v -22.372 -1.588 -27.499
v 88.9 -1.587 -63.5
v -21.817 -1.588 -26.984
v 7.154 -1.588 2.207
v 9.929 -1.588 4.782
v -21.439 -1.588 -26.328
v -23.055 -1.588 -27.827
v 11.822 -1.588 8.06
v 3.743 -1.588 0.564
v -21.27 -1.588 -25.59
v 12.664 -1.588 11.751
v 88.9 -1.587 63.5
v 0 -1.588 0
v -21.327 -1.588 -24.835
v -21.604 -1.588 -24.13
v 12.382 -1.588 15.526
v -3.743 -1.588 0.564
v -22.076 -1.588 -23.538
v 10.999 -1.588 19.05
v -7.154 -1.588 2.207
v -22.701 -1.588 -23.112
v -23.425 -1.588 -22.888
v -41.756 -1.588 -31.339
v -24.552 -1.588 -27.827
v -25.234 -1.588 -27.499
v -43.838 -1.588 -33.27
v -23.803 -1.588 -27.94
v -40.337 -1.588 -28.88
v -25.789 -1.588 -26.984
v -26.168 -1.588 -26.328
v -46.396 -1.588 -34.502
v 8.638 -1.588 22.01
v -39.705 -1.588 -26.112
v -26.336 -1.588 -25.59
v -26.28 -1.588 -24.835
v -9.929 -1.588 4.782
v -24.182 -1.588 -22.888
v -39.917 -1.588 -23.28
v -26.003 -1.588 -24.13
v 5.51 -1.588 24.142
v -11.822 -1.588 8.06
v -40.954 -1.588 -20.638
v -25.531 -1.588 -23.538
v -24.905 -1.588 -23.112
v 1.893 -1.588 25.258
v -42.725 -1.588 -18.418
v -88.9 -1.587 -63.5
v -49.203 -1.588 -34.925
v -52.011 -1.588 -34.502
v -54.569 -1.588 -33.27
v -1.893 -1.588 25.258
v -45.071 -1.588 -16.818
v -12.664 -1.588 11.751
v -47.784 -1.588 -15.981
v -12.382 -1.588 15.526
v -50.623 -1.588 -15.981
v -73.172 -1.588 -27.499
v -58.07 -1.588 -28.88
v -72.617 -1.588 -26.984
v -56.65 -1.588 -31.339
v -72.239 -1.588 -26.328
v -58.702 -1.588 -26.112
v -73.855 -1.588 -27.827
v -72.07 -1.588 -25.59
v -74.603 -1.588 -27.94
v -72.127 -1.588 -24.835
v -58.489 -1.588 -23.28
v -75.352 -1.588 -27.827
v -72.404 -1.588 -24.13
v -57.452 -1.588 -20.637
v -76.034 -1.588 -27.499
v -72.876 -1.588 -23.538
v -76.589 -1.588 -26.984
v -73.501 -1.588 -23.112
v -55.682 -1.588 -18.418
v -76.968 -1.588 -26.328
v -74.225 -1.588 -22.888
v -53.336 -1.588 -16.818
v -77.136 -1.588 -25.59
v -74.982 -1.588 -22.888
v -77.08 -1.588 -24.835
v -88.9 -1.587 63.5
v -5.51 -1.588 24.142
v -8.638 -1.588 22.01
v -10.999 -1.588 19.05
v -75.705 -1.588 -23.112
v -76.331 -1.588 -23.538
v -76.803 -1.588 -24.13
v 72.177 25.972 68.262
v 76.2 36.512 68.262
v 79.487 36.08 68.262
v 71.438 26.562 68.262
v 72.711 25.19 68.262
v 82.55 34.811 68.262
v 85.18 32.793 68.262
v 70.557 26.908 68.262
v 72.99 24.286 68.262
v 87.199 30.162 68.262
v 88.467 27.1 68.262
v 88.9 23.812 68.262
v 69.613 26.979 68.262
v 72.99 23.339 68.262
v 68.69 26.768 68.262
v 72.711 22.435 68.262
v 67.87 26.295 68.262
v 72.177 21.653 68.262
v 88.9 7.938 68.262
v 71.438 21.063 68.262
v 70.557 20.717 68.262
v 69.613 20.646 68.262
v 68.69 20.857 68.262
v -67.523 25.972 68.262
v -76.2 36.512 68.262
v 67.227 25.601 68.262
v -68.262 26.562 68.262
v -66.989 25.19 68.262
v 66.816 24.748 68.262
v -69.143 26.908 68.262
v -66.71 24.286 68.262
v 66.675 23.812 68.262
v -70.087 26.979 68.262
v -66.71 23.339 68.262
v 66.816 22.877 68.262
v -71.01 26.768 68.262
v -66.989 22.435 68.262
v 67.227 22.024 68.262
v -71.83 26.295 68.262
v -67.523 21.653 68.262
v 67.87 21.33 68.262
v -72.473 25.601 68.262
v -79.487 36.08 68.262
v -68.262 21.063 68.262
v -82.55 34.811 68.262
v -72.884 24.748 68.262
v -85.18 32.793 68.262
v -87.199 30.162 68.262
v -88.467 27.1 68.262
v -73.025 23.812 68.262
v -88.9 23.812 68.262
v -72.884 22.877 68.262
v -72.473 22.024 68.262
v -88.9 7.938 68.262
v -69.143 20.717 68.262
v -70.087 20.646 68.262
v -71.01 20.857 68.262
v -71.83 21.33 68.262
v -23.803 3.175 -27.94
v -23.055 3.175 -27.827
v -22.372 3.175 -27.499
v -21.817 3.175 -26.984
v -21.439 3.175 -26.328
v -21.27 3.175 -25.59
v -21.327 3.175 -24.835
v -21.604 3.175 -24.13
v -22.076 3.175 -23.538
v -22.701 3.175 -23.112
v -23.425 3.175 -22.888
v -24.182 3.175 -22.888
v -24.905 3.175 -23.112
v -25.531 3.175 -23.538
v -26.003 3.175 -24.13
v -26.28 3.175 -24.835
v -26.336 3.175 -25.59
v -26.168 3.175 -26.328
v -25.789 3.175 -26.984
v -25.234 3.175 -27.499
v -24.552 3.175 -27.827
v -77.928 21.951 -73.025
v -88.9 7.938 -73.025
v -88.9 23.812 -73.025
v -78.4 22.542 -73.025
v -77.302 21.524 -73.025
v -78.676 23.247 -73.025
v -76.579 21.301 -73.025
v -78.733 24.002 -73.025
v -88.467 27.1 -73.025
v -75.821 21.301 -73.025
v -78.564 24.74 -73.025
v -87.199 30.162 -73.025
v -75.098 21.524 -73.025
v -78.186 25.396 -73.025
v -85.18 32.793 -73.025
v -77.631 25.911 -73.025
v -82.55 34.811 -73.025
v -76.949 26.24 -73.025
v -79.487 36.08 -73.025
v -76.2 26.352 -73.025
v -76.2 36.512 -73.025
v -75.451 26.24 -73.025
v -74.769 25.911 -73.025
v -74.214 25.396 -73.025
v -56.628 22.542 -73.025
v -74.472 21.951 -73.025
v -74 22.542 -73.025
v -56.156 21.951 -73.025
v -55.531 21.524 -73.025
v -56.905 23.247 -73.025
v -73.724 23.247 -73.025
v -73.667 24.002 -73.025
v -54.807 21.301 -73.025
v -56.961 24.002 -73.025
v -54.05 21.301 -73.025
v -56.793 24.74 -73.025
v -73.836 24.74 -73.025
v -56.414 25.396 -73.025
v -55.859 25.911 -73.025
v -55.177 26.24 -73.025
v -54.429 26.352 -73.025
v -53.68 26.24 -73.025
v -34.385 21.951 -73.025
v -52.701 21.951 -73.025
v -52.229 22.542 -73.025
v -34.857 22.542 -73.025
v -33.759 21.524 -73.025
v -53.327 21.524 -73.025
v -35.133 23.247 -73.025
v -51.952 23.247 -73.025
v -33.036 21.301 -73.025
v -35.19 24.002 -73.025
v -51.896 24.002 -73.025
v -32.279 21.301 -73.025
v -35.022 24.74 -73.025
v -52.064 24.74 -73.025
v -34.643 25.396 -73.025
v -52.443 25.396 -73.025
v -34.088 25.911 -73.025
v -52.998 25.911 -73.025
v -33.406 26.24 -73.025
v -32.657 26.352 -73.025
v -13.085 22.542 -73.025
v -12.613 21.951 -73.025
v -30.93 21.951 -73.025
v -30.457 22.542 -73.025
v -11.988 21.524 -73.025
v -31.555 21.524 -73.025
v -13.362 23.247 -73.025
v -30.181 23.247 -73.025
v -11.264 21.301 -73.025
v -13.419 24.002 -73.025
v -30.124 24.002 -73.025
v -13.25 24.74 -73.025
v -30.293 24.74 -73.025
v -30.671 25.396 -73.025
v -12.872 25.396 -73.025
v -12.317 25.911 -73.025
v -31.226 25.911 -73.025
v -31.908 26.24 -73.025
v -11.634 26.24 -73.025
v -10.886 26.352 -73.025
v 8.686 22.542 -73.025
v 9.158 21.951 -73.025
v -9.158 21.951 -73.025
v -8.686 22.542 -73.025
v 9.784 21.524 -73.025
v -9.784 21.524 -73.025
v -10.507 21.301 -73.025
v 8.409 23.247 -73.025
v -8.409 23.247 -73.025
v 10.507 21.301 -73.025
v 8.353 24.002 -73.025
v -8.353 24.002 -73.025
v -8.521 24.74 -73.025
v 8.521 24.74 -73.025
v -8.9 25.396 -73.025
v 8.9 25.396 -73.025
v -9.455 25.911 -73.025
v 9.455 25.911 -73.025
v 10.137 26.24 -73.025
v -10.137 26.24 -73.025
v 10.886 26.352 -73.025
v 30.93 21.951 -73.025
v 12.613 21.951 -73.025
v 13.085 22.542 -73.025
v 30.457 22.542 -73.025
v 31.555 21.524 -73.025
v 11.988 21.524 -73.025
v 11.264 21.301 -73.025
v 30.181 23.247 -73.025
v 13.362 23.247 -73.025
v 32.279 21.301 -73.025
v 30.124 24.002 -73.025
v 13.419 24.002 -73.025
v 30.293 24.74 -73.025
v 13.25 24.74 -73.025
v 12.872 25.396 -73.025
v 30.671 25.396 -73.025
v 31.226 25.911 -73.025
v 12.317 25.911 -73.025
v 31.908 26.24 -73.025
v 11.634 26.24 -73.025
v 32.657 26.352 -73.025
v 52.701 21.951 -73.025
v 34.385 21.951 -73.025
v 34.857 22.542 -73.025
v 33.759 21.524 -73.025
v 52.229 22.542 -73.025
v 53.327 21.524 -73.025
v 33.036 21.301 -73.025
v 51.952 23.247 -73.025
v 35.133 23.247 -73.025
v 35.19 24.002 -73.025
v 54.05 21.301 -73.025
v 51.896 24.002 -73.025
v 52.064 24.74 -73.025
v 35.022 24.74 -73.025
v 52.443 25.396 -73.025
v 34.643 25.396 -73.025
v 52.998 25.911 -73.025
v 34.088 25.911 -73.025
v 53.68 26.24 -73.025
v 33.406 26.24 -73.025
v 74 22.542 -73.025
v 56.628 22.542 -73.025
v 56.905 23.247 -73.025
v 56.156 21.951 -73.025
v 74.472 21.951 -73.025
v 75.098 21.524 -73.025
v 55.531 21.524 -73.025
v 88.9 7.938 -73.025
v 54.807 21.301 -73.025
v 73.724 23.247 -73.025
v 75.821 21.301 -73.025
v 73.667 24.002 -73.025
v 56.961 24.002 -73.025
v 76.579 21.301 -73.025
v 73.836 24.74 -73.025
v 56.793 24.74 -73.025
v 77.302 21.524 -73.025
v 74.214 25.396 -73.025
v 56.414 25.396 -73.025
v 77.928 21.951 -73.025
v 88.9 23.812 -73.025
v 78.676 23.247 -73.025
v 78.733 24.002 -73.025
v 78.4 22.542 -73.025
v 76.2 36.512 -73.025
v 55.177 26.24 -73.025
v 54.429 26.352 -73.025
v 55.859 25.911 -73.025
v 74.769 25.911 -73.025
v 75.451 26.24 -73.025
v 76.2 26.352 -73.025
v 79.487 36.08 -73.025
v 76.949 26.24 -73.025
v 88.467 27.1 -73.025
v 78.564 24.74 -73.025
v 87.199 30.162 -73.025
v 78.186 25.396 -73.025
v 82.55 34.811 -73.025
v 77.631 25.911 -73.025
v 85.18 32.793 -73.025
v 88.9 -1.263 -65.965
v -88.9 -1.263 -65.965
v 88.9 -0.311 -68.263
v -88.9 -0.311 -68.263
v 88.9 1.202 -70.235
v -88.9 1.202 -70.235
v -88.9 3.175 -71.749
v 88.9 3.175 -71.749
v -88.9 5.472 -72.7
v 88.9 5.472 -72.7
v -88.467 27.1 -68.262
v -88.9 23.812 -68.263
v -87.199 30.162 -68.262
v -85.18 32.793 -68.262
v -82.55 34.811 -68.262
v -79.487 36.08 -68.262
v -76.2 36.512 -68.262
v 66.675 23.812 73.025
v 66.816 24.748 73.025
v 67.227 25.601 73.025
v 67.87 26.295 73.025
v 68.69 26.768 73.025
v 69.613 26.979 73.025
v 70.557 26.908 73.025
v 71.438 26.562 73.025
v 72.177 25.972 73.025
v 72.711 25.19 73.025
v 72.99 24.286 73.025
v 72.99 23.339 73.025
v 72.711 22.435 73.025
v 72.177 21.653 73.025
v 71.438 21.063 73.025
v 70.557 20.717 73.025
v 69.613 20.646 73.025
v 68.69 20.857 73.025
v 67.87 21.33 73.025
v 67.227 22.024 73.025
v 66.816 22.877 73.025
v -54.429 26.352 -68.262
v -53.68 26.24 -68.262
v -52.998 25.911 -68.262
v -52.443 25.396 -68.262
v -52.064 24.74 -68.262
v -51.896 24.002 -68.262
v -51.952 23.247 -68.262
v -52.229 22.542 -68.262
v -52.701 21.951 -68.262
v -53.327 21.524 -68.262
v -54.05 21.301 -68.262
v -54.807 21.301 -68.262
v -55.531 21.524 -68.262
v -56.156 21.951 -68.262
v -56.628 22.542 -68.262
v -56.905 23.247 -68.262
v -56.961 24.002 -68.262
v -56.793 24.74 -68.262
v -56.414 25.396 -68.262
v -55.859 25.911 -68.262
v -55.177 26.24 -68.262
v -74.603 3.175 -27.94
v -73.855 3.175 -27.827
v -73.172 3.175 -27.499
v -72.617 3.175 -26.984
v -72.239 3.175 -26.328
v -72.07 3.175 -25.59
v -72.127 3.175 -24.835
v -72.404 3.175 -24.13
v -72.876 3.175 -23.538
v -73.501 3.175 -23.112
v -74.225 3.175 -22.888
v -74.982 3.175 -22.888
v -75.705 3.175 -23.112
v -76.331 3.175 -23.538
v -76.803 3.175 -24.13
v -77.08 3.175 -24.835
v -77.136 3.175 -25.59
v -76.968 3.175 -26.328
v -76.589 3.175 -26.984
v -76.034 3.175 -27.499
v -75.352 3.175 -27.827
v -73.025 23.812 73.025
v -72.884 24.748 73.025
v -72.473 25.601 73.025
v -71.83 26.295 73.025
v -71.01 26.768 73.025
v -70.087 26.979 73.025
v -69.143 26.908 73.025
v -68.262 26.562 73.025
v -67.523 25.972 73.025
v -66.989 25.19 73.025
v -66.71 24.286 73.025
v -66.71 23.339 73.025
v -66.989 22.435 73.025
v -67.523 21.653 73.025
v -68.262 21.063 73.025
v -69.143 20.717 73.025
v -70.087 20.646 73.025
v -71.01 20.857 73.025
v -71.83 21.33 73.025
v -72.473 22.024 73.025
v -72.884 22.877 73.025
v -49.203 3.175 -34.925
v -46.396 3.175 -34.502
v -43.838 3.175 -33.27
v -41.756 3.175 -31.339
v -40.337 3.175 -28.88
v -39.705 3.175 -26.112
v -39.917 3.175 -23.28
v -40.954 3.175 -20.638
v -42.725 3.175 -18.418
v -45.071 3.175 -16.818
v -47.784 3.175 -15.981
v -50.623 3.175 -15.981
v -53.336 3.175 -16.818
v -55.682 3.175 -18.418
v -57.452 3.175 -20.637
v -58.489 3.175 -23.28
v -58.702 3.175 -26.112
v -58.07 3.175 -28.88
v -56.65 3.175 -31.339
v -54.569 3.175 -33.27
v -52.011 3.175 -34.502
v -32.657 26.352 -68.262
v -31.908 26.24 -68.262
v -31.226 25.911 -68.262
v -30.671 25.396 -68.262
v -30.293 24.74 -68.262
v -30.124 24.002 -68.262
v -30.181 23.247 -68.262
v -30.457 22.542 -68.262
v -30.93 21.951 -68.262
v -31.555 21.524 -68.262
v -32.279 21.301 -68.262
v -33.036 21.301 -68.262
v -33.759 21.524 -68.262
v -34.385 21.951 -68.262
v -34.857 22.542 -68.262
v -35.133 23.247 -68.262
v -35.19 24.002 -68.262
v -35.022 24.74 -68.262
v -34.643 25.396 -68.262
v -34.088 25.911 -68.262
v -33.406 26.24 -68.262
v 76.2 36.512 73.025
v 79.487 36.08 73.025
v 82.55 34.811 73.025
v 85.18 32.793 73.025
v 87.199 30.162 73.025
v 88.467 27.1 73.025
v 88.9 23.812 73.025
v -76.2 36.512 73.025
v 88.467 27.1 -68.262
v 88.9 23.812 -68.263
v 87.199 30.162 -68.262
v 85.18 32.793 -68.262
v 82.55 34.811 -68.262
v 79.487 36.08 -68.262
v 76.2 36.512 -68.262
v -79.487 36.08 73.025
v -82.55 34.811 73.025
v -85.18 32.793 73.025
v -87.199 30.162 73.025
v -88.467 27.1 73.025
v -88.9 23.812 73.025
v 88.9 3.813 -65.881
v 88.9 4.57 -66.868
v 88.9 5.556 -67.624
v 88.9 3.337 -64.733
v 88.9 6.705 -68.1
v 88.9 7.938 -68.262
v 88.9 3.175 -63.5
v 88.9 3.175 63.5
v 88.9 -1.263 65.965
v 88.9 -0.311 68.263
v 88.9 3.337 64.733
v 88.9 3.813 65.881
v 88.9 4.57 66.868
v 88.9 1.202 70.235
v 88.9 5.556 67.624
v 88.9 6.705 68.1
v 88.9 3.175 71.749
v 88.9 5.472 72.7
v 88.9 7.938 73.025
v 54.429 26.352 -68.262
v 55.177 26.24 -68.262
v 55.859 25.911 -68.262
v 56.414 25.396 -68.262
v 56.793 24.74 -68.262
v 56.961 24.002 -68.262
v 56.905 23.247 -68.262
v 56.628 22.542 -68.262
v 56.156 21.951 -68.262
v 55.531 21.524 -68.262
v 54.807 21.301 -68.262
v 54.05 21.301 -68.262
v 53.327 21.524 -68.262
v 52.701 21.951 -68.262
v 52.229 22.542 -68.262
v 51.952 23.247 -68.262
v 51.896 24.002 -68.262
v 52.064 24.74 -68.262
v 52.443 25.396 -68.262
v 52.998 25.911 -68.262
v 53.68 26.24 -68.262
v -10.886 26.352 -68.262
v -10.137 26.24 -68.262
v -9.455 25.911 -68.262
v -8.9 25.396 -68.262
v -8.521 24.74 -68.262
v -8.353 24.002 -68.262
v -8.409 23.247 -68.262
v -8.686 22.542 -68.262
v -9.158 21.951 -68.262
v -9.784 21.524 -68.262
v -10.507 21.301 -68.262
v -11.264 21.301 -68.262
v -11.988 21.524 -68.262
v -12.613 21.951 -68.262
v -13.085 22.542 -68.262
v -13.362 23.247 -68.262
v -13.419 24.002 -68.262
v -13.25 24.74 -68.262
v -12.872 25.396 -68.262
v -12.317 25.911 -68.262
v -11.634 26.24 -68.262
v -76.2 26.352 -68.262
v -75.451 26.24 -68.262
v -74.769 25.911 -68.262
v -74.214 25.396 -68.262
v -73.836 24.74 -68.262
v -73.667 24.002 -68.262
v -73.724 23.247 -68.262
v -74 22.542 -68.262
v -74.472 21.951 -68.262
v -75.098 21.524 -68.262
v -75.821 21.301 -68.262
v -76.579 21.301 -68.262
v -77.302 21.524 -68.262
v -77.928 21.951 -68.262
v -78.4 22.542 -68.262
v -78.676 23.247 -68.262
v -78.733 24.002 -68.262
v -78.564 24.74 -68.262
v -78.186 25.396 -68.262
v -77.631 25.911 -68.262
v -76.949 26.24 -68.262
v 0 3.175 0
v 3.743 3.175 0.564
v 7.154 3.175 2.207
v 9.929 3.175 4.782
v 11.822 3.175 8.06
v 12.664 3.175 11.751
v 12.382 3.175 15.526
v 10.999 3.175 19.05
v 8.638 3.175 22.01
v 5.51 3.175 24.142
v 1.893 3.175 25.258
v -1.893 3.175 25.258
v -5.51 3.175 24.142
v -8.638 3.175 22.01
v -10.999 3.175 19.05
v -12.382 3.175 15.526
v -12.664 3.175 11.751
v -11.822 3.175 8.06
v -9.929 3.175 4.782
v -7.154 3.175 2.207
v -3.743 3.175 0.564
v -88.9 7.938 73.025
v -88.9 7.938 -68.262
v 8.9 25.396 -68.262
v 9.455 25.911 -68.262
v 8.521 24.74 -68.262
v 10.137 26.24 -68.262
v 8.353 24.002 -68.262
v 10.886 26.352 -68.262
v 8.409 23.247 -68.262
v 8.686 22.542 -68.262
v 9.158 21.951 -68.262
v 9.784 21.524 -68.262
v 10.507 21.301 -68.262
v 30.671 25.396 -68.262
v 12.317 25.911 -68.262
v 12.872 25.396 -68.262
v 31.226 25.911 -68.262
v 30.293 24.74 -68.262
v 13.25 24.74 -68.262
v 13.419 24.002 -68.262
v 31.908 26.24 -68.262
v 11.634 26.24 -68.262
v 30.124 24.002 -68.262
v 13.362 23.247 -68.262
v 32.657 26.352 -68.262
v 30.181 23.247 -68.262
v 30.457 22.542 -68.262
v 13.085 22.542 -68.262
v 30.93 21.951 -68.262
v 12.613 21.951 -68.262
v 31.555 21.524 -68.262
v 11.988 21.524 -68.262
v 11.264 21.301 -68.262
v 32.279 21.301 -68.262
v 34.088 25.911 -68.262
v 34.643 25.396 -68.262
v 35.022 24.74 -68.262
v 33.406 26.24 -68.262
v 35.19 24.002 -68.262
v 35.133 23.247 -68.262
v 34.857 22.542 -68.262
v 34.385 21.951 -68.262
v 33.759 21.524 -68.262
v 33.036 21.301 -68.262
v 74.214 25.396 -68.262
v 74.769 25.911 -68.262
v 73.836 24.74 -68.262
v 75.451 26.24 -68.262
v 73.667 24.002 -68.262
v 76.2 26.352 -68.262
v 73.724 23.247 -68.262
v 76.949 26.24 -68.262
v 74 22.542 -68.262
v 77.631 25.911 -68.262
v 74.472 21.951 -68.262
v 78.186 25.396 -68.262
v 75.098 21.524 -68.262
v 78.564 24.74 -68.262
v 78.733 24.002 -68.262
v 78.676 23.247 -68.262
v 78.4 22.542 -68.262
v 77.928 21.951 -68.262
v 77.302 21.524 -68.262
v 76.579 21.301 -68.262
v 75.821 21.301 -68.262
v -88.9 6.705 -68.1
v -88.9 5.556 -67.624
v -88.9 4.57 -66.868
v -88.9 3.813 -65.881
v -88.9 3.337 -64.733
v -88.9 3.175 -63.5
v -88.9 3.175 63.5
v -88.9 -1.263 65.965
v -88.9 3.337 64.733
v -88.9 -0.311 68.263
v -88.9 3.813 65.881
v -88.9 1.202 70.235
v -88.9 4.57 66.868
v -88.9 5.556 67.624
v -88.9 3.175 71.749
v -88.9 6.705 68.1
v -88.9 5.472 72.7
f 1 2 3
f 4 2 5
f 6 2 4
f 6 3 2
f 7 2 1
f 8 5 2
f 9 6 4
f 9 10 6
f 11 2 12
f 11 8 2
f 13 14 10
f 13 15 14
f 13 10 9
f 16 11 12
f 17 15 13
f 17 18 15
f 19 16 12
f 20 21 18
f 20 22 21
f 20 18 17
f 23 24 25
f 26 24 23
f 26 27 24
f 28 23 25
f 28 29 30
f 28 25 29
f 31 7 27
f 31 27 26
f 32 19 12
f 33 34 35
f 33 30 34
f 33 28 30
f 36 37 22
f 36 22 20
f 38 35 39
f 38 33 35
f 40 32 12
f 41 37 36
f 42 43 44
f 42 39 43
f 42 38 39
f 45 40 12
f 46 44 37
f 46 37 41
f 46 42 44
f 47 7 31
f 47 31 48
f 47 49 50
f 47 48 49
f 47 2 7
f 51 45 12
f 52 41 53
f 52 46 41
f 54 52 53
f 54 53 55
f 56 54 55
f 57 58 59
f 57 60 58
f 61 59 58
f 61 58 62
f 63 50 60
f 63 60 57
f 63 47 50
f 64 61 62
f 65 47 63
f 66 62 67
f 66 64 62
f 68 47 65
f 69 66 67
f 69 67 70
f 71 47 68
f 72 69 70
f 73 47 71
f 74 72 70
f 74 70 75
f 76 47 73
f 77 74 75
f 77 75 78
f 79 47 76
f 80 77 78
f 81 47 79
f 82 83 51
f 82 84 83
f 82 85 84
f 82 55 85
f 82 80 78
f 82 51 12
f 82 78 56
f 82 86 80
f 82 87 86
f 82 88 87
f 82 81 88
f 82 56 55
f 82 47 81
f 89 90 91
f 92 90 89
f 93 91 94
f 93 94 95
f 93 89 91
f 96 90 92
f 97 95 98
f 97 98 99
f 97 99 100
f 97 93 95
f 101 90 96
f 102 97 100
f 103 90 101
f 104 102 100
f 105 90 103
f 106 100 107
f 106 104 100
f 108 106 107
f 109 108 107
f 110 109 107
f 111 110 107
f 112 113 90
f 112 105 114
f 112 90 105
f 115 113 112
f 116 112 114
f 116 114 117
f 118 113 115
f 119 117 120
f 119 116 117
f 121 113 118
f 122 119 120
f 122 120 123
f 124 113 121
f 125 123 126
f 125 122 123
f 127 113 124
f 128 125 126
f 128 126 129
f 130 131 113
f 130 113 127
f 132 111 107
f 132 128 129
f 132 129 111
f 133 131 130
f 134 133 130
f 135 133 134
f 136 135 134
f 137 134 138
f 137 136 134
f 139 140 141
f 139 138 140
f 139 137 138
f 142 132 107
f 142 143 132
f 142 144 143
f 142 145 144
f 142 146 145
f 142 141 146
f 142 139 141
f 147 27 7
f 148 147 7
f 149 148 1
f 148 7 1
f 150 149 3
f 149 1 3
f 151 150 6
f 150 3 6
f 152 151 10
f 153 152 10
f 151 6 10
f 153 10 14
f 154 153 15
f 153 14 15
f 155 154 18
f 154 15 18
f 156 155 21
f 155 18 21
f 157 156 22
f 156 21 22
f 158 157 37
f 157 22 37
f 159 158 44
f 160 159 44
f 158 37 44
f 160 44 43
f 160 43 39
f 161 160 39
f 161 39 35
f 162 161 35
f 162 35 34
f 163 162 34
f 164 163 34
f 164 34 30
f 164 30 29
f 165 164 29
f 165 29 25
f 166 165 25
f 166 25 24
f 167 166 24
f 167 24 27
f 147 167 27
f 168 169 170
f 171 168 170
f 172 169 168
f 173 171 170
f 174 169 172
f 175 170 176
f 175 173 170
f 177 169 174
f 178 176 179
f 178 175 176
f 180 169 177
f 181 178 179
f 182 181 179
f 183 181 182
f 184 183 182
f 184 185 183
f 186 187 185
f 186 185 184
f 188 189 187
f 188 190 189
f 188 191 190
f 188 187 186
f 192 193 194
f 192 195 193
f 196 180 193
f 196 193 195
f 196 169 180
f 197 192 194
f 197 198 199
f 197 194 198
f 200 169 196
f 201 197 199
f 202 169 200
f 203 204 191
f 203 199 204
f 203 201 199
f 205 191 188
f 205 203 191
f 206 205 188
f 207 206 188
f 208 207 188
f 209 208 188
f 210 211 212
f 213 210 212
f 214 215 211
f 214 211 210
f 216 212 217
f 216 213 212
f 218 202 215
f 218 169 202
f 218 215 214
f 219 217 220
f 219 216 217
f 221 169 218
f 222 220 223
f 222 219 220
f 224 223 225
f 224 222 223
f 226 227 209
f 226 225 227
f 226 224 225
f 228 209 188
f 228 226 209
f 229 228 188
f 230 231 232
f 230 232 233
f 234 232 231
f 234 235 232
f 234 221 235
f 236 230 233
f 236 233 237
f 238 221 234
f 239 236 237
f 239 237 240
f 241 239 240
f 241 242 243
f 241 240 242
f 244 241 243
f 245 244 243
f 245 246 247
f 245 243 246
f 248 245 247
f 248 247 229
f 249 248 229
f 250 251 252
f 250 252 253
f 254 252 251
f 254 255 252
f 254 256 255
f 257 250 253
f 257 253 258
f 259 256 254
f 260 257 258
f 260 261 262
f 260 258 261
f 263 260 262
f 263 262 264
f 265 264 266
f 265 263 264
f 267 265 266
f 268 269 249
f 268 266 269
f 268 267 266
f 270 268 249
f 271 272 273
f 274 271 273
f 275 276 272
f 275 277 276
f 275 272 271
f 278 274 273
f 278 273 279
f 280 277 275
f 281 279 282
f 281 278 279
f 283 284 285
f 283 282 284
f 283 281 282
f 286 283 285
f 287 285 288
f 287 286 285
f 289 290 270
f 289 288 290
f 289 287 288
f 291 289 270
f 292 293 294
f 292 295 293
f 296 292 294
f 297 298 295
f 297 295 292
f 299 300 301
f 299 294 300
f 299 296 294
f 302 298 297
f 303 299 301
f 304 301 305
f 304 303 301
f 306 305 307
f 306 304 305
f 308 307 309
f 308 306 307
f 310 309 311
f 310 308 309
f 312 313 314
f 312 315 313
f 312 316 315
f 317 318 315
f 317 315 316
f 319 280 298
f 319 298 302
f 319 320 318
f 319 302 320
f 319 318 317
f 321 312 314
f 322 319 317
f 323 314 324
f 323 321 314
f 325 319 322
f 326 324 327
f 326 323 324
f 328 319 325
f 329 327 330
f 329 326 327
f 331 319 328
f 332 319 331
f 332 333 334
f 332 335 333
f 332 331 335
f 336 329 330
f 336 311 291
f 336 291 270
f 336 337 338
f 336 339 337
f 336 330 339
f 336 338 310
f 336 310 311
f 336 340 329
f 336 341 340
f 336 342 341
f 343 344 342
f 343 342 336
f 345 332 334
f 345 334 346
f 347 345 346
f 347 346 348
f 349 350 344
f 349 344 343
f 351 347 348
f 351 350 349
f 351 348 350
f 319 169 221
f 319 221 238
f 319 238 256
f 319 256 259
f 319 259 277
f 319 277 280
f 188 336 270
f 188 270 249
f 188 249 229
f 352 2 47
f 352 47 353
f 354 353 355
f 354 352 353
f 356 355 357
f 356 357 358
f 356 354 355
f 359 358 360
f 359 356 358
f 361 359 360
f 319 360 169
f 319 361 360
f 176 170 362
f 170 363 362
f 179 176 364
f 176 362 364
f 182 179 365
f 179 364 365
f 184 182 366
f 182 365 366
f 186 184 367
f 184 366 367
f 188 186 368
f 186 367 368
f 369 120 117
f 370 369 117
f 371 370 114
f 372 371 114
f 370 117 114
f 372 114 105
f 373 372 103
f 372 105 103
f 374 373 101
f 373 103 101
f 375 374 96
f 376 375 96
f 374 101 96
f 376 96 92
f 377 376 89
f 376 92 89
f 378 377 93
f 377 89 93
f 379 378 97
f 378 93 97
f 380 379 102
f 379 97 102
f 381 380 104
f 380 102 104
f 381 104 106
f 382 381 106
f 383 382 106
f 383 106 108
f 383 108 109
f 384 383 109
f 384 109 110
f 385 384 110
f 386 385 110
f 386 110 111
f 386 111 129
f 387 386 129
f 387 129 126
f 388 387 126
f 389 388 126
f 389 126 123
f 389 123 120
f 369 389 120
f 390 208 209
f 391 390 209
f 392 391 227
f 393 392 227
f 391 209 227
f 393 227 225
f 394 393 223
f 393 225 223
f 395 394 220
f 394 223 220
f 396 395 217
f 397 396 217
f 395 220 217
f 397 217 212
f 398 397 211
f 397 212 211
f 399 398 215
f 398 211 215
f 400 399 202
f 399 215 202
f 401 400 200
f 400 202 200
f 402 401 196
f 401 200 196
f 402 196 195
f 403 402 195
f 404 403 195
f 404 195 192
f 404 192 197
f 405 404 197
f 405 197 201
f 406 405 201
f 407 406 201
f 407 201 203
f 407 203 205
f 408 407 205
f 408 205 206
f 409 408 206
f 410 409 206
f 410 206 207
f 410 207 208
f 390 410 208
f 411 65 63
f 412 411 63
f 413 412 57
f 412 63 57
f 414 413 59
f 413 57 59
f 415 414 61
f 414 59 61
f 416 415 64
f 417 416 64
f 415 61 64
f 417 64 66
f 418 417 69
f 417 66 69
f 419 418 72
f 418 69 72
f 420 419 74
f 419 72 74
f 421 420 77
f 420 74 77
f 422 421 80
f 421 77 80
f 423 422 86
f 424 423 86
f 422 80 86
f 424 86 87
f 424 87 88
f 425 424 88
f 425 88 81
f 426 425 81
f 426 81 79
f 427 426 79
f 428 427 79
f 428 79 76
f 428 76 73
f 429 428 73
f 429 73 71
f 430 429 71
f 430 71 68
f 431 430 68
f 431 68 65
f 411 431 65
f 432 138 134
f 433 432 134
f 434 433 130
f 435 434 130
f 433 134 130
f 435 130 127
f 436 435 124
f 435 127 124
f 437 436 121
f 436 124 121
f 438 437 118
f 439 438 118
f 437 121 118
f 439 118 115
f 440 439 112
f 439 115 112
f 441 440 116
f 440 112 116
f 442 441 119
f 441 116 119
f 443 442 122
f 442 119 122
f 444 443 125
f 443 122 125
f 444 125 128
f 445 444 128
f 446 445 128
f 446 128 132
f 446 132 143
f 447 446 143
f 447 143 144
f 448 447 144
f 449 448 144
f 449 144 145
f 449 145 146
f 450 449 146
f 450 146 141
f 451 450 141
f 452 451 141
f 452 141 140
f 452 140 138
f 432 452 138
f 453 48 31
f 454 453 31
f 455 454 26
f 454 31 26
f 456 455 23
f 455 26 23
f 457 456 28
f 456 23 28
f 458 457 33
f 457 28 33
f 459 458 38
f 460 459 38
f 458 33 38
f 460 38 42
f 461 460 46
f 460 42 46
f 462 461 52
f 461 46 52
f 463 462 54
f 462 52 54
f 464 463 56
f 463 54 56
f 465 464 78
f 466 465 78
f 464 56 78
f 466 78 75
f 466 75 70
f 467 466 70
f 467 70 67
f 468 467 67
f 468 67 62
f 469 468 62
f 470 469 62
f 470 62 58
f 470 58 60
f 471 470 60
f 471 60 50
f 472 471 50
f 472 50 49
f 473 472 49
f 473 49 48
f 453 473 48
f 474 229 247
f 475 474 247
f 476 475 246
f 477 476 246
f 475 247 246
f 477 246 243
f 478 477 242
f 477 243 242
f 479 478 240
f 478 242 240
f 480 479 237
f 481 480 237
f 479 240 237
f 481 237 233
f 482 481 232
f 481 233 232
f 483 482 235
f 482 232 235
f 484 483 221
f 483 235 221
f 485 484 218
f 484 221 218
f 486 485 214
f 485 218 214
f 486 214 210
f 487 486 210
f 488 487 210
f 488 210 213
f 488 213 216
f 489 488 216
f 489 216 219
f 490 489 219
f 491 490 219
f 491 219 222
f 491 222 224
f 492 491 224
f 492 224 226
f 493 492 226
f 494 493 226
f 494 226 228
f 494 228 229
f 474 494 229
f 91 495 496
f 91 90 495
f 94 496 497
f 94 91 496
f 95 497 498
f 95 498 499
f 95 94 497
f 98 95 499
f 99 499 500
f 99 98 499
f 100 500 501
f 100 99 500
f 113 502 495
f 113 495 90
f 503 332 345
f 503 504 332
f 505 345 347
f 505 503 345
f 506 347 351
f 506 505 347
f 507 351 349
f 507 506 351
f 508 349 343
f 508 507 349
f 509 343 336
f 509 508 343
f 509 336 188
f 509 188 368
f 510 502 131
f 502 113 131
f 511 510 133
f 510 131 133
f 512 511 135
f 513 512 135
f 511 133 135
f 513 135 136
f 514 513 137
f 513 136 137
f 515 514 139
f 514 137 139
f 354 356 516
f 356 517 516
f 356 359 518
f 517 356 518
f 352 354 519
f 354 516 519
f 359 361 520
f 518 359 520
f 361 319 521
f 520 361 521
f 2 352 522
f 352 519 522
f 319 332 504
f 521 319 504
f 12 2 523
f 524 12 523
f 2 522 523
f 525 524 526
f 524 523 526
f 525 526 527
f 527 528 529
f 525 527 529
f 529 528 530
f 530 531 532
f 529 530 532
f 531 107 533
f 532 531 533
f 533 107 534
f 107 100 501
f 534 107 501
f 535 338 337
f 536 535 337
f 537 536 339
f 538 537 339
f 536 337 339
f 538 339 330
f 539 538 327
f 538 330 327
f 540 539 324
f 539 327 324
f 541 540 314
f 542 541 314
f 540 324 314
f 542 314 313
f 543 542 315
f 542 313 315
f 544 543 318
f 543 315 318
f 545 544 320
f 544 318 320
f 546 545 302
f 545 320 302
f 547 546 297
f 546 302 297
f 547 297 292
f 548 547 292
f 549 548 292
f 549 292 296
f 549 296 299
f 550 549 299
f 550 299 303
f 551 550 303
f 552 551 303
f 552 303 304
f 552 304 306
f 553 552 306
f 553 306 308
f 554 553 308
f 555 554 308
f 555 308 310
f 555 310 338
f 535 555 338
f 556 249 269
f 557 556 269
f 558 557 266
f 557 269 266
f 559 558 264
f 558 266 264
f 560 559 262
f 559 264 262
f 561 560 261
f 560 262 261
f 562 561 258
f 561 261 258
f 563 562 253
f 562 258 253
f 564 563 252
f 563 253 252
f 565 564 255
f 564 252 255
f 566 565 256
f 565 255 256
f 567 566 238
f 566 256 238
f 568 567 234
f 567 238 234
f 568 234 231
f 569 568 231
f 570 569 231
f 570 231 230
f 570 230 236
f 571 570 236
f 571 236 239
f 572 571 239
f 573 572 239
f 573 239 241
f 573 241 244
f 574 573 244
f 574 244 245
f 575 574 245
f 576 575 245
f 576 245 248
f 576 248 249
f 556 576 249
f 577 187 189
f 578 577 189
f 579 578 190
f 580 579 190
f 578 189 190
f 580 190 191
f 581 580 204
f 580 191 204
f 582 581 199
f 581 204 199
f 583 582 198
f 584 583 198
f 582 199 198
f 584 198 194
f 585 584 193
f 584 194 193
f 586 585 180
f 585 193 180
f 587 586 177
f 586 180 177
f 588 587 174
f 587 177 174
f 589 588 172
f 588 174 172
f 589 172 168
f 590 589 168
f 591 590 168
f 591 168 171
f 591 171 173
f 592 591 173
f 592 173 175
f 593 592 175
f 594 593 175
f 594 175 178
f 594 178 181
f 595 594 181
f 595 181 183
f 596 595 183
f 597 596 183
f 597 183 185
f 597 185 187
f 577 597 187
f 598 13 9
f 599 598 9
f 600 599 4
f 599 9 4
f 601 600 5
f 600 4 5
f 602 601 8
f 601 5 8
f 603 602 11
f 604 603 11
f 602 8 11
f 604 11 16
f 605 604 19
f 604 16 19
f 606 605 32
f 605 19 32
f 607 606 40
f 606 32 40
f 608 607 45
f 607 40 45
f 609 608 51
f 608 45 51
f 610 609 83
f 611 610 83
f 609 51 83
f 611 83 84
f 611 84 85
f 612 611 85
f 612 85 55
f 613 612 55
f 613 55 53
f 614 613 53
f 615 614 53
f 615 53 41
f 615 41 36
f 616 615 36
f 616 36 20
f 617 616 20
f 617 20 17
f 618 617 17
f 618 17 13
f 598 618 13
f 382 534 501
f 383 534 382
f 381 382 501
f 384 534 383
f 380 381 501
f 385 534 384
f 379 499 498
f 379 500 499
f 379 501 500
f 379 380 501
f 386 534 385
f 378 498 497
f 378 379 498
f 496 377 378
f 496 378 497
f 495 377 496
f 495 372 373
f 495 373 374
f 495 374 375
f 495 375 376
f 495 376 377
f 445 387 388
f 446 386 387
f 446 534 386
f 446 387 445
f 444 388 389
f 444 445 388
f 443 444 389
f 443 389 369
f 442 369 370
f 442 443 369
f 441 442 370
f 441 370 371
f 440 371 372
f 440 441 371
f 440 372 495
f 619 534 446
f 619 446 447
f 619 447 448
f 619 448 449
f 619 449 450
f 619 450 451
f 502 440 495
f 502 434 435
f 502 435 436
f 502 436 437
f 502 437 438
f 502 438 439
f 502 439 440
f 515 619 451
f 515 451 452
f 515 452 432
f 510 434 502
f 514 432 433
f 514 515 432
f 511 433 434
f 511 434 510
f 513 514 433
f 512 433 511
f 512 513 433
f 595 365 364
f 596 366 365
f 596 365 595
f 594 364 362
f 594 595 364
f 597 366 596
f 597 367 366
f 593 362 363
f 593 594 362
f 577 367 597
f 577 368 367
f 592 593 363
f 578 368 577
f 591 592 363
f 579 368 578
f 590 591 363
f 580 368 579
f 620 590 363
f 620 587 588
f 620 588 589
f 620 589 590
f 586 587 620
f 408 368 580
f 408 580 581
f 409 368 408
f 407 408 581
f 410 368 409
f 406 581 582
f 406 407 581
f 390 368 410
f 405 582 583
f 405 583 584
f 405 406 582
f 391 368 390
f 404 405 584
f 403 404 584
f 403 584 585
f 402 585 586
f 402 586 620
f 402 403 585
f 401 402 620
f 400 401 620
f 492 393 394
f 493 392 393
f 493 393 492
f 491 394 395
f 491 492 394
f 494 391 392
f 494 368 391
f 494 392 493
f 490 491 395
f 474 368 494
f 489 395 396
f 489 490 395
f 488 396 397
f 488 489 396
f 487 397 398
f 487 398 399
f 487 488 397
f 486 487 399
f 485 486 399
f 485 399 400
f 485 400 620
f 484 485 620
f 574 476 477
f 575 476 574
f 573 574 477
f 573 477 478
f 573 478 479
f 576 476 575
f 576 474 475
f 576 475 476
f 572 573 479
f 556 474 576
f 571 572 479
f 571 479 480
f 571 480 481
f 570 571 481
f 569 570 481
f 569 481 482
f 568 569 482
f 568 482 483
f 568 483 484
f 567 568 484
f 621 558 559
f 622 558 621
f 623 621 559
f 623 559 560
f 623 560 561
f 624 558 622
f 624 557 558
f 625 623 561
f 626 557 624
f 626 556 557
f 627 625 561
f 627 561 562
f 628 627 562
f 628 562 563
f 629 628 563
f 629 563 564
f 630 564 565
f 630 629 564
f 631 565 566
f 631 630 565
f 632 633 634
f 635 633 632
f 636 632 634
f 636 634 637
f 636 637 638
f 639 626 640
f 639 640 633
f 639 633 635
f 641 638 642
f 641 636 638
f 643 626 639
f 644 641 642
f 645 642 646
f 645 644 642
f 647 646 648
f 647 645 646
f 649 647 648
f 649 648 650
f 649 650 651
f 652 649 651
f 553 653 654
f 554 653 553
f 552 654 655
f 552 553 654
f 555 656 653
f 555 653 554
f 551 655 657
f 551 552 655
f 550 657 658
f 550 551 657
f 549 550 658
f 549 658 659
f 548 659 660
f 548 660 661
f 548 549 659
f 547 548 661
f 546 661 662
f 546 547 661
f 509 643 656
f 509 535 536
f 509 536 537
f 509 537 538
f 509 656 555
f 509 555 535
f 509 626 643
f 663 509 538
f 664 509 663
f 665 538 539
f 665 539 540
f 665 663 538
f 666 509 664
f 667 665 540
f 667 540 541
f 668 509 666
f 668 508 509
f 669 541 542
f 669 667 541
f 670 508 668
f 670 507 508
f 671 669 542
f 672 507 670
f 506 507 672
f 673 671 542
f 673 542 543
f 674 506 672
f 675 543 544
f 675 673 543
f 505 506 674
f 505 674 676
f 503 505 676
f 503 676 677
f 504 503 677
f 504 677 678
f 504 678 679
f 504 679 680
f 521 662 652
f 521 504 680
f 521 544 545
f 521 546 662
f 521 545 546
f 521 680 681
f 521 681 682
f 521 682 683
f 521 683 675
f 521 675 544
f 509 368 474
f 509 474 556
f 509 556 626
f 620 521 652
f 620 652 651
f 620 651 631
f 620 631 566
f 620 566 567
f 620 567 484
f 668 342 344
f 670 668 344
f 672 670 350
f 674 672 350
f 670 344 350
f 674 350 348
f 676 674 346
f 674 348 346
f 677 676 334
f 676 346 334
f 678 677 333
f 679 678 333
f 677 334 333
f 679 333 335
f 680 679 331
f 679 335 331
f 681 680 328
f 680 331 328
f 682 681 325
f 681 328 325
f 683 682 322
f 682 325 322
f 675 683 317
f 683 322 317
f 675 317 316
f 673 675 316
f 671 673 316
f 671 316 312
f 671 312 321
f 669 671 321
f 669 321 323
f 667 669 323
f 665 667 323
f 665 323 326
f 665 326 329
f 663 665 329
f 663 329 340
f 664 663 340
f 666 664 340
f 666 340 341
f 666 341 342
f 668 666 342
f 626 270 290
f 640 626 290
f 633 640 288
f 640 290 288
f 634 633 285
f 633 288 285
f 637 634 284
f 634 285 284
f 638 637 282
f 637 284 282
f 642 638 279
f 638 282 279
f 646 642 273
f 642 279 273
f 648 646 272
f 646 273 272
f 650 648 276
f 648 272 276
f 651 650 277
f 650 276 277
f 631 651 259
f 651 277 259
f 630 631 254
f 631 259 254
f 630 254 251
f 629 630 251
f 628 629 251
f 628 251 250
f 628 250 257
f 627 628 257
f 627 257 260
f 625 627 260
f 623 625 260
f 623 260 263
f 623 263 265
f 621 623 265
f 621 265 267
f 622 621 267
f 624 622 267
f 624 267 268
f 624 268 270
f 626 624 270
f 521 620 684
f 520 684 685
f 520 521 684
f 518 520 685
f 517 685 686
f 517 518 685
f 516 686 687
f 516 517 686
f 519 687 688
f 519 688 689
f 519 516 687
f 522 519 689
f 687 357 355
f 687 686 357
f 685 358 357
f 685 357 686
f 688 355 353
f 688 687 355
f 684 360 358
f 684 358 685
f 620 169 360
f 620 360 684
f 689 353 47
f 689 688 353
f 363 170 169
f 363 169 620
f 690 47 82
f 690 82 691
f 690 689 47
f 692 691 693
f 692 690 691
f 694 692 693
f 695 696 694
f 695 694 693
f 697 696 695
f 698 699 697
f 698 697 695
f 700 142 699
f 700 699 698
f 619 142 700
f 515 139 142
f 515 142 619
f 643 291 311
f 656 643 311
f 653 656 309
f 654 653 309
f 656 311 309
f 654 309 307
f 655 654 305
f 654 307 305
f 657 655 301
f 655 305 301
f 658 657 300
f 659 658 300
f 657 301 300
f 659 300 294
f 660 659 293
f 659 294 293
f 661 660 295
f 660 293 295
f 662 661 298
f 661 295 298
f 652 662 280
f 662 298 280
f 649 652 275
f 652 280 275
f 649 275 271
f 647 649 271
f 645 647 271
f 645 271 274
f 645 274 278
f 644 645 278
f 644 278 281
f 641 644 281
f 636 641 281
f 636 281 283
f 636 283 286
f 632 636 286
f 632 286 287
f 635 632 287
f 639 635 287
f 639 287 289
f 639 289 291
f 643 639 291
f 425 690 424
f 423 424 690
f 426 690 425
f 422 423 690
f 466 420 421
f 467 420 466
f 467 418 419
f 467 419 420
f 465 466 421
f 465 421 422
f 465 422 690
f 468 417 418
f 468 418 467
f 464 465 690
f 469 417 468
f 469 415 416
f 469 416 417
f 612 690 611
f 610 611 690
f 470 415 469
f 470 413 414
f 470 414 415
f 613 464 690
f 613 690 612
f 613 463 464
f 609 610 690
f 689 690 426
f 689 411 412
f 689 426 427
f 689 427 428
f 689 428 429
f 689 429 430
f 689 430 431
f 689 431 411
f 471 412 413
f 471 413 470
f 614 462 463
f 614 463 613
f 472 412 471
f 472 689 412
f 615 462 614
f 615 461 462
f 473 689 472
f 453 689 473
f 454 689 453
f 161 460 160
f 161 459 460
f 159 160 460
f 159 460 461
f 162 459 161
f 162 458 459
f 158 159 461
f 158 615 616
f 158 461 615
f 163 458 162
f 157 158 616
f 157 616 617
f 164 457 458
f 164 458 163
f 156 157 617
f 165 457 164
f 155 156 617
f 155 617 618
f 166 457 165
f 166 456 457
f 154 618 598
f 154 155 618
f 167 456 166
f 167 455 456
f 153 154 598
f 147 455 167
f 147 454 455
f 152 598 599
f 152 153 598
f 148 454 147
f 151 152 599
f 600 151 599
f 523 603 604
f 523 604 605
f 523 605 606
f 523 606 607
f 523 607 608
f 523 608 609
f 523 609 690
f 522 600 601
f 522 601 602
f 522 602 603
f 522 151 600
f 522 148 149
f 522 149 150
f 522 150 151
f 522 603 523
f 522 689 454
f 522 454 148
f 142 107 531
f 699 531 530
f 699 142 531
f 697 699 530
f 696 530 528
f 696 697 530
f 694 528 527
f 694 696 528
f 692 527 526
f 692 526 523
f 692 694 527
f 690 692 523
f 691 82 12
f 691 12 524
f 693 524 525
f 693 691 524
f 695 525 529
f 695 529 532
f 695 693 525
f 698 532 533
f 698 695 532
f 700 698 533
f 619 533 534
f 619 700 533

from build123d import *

# Parameters (mm, degrees)
SKETCH1_W                = 177.8
SKETCH1_H                = 127
BOSS_EXTRUDE1_DEPTH      = 3.175
CONVERT_SOLID2_START     = -88.9
CONVERT_SOLID2_OUTLINE_W = 1.5875
CONVERT_SOLID2_OUTLINE_H = 127
CONVERT_SOLID2_DEPTH     = 177.8
EDGE_FLANGE1_DEPTH       = 177.8
EDGE_FLANGE2_DEPTH       = 177.8
SKETCH17_R               = 2.54
CUT_EXTRUDE1_DEPTH       = 5.08
FILLET1_R                = 12.7
SKETCH18_R               = 3.175
CUT_EXTRUDE2_DEPTH       = 5.08
SKETCH19_R               = 12.7
CUT_EXTRUDE3_DEPTH       = 12.7
SKETCH26_R               = 9.525
CUT_EXTRUDE9_DEPTH       = 5.08
SKETCH27_R               = 2.54
CUT_EXTRUDE10_DEPTH      = 5.08
SKETCH28_R               = 2.54
CUT_EXTRUDE11_DEPTH      = 5.08


# Read off the part's stored shape, not the designer's step: Convert-Solid2
# Sheet-metal steps are written as plain solids
with BuildPart() as part:
    # Sketch1 → Boss-Extrude1 (new body)
    with BuildSketch(Plane(origin=(0, 0, 0), x_dir=(1, 0, 0), z_dir=(0, 1, 0))):
        Rectangle(SKETCH1_W, SKETCH1_H)
    extrude(amount=BOSS_EXTRUDE1_DEPTH)

    # Convert-Solid2 outline → Convert-Solid2 (add)
    with BuildSketch(Plane.YZ.offset(CONVERT_SOLID2_START)):
        with Locations((-0.79375, 0)):
            Rectangle(CONVERT_SOLID2_OUTLINE_W, CONVERT_SOLID2_OUTLINE_H)
    extrude(amount=CONVERT_SOLID2_DEPTH)

    # Edge-Flange1 section (across the edge) → Edge-Flange1 (add)
    with BuildSketch(Plane(origin=(88.9, 3.175, -68.2625), x_dir=(0, 0, 1), z_dir=(-1, 0, 0))):
        with BuildLine():
            Line((-4.7625, 4.7625), (-4.7625, 33.3375))
            Line((-4.7625, 33.3375), (0, 33.3375))
            Line((0, 33.3375), (0, 4.7625))
            ThreePointArc((0, 4.7625), (1.394903955, 1.394903955), (4.7625, 0))
            Line((4.7625, 0), (4.7625, -4.7625))
            ThreePointArc((4.7625, -4.7625), (-1.972692091, -1.972692091), (-4.7625, 4.7625))
        make_face()
    extrude(amount=EDGE_FLANGE1_DEPTH)

    # Edge-Flange2 section (across the edge) → Edge-Flange2 (add)
    with BuildSketch(Plane(origin=(-88.9, 3.175, 68.2625), x_dir=(0, 0, -1), z_dir=(1, 0, 0))):
        with BuildLine():
            Line((-4.7625, 4.7625), (-4.7625, 33.3375))
            Line((-4.7625, 33.3375), (0, 33.3375))
            Line((0, 33.3375), (0, 4.7625))
            ThreePointArc((0, 4.7625), (1.394903955, 1.394903955), (4.7625, 0))
            Line((4.7625, 0), (4.7625, -4.7625))
            ThreePointArc((4.7625, -4.7625), (-1.972692091, -1.972692091), (-4.7625, 4.7625))
        make_face()
    extrude(amount=EDGE_FLANGE2_DEPTH)

    # Sketch17 → Cut-Extrude1 (cut)
    with BuildSketch(Plane(origin=(0, 0, -73.025), x_dir=(-1, 0, 0), z_dir=(0, 0, -1))):
        with Locations(Location((-76.2, 23.8125, 0), (0, 0, 90))):
            Circle(SKETCH17_R)
        with Locations(Location((-54.428571429, 23.8125, 0), (0, 0, 90))):
            Circle(SKETCH17_R)
        with Locations(Location((-32.657142857, 23.8125, 0), (0, 0, 90))):
            Circle(SKETCH17_R)
        with Locations(Location((-10.885714286, 23.8125, 0), (0, 0, 90))):
            Circle(SKETCH17_R)
        with Locations(Location((10.885714286, 23.8125, 0), (0, 0, 90))):
            Circle(SKETCH17_R)
        with Locations(Location((32.657142857, 23.8125, 0), (0, 0, 90))):
            Circle(SKETCH17_R)
        with Locations(Location((54.428571429, 23.8125, 0), (0, 0, 90))):
            Circle(SKETCH17_R)
        with Locations(Location((76.2, 23.8125, 0), (0, 0, 90))):
            Circle(SKETCH17_R)
    extrude(amount=-CUT_EXTRUDE1_DEPTH, mode=Mode.SUBTRACT)

    # Fillet1
    fillet1_edges = [part.edges().sort_by_distance(p)[0] for p in [
        (88.9, 36.5125, -70.64375),
        (-88.9, 36.5125, -70.64375),
        (-88.9, 36.5125, 70.64375),
        (88.9, 36.5125, 70.64375),
    ]]
    fillet(fillet1_edges, radius=FILLET1_R)

    # Sketch18 → Cut-Extrude2 (cut)
    with BuildSketch(Plane(origin=(0, 0, 68.2625), x_dir=(-1, 0, 0), z_dir=(0, 0, -1))):
        with Locations((69.85, 23.8125)):
            Circle(SKETCH18_R)
        with Locations((-69.85, 23.8125)):
            Circle(SKETCH18_R)
    extrude(amount=-CUT_EXTRUDE2_DEPTH, mode=Mode.SUBTRACT)

    # Sketch19 → Cut-Extrude3 (cut)
    with BuildSketch(Plane(origin=(0, -1.5875, 0), x_dir=(-1, 0, 0), z_dir=(0, -1, 0))):
        with Locations(Location((0, -12.7, 0), (0, 0, 90))):
            Circle(SKETCH19_R)
    extrude(amount=-CUT_EXTRUDE3_DEPTH, mode=Mode.SUBTRACT)

    # Sketch26 → Cut-Extrude9 (cut)
    with BuildSketch(Plane(origin=(0, -1.5875, 0), x_dir=(-1, 0, 0), z_dir=(0, -1, 0))):
        with Locations(Location((49.203281395, 25.4, 0), (0, 0, 90))):
            Circle(SKETCH26_R)
    extrude(amount=-CUT_EXTRUDE9_DEPTH, mode=Mode.SUBTRACT)

    # Sketch27 → Cut-Extrude10 (cut)
    with BuildSketch(Plane.XZ.offset(1.5875)):
        with Locations(Location((-23.803281395, -25.4, 0), (0, 0, 270))):
            Circle(SKETCH27_R)
    extrude(amount=-CUT_EXTRUDE10_DEPTH, mode=Mode.SUBTRACT)

    # Sketch28 → Cut-Extrude11 (cut)
    with BuildSketch(Plane(origin=(0, -1.5875, 0), x_dir=(-1, 0, 0), z_dir=(0, -1, 0))):
        with Locations(Location((74.603281395, 25.4, 0), (0, 0, 90))):
            Circle(SKETCH28_R)
    extrude(amount=-CUT_EXTRUDE11_DEPTH, mode=Mode.SUBTRACT)


solid = part.part
